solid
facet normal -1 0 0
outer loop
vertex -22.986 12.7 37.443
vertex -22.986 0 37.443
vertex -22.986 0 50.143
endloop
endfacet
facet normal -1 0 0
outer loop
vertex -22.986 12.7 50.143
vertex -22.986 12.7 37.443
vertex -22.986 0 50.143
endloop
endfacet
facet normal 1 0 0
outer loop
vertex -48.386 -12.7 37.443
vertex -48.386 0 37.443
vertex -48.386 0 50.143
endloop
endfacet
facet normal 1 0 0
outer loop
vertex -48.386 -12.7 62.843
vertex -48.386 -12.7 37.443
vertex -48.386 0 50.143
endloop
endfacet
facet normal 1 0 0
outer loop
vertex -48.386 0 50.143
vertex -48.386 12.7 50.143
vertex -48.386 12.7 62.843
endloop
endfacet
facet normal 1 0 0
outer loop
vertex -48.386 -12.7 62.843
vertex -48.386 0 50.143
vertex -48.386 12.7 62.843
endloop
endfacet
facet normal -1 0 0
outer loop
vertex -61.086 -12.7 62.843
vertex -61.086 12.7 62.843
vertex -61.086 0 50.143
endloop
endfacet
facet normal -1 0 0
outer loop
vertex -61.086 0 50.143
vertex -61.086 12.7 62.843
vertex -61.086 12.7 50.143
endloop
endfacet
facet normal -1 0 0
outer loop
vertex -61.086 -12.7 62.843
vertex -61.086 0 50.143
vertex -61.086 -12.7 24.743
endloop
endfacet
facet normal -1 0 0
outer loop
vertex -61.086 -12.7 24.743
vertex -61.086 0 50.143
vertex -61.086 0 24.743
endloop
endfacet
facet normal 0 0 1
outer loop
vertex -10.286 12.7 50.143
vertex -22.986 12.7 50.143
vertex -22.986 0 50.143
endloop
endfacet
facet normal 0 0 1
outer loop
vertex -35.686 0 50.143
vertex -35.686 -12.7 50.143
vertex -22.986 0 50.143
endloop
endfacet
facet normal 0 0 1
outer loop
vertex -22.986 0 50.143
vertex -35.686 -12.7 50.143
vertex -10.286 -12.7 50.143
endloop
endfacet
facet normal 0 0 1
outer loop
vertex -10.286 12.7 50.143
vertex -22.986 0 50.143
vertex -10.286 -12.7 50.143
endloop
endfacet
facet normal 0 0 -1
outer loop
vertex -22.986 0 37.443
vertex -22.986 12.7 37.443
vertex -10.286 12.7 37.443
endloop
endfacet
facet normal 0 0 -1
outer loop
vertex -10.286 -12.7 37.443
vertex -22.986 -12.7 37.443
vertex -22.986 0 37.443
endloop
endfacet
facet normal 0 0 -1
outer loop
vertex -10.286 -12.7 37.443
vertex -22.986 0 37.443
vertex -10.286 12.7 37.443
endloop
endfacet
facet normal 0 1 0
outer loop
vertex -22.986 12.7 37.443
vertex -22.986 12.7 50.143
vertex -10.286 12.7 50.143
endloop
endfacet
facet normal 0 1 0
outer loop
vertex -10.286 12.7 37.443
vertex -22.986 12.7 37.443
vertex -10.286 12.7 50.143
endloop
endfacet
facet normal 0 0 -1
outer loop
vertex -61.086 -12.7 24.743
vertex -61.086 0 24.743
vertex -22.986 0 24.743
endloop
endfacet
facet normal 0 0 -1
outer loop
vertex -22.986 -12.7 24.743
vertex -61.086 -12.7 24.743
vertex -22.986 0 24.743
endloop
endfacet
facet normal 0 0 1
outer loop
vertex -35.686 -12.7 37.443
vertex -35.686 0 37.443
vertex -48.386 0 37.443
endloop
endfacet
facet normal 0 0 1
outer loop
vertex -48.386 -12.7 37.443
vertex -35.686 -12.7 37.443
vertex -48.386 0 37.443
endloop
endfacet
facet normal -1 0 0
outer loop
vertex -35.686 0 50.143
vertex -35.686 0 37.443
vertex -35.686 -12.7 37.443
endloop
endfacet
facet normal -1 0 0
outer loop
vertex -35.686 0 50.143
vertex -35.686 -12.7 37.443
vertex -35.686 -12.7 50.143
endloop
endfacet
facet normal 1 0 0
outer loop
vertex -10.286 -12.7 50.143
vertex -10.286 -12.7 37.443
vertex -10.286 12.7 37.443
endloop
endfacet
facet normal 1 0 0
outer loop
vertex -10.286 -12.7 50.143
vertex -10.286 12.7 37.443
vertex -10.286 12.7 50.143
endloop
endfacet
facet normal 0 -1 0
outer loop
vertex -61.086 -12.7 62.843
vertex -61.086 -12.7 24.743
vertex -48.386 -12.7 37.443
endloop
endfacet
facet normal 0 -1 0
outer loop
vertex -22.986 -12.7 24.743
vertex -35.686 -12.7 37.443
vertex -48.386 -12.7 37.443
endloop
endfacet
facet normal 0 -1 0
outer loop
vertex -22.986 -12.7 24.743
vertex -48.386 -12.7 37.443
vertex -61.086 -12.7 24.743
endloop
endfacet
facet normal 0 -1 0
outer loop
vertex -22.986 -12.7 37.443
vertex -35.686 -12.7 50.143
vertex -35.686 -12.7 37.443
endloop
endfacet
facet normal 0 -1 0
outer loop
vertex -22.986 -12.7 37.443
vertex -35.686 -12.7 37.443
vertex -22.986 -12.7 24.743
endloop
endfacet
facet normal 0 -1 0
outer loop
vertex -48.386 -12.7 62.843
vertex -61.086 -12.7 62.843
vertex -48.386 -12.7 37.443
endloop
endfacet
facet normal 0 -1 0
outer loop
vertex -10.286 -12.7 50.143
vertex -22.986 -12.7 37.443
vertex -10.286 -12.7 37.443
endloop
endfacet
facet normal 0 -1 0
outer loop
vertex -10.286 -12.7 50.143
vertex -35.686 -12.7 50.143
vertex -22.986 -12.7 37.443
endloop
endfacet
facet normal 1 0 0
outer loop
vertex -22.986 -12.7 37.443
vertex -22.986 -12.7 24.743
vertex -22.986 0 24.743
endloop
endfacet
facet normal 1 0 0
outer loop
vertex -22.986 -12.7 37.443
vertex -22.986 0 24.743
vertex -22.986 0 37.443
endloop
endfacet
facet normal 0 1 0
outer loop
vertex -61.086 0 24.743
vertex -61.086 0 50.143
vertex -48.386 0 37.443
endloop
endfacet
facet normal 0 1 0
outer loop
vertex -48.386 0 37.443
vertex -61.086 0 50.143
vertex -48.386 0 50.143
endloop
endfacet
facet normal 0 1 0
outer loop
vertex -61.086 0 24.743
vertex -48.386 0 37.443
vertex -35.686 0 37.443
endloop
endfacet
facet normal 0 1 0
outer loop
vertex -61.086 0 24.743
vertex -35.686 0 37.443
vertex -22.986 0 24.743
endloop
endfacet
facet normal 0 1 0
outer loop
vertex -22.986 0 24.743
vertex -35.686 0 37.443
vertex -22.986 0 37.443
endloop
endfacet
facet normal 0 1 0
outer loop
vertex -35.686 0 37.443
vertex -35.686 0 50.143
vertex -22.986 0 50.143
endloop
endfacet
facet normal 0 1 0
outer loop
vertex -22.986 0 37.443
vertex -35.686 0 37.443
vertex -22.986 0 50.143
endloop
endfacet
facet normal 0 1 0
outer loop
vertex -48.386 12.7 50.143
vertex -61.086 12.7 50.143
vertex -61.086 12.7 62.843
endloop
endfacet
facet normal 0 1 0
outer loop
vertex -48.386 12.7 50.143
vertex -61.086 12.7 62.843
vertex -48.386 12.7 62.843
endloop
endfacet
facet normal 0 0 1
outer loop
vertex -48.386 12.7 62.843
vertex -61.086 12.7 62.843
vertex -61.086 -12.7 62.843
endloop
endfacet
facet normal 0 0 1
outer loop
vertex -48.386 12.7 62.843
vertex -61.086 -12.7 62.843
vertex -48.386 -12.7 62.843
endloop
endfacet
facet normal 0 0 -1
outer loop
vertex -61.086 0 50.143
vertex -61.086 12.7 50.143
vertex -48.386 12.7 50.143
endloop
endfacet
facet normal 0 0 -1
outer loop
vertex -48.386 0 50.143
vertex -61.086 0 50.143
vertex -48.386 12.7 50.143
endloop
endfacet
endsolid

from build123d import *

# Parameters (mm, degrees)
F0_W     = 12.7
F0_H     = 12.7
F1_DEPTH = 12.7
F2_DEPTH = 12.7


with BuildPart() as f1:
    # F0 (on Front) → F1 (new body)
    with BuildSketch(Plane.XZ):
        with Locations((-54.735524, 43.792849)):
            Rectangle(F0_W, F0_H)
        with Locations((-54.735524, 31.092849)):
            Rectangle(F0_W, F0_H)
        with Locations((-29.335524, 31.092849)):
            Rectangle(F0_W, F0_H)
        with Locations((-42.035524, 31.092849)):
            Rectangle(F0_W, F0_H)
        with Locations((-29.335524, 43.792849)):
            Rectangle(F0_W, F0_H)
    extrude(amount=F1_DEPTH)

    # F0 (on Front) → F2 (join, symmetric)
    with BuildSketch(Plane.XZ):
        with Locations((-54.735524, 56.492849)):
            Rectangle(F0_W, F0_H)
        with Locations((-16.635524, 43.792849)):
            Rectangle(F0_W, F0_H)
    extrude(amount=F2_DEPTH, both=True)


solid = f1.part
